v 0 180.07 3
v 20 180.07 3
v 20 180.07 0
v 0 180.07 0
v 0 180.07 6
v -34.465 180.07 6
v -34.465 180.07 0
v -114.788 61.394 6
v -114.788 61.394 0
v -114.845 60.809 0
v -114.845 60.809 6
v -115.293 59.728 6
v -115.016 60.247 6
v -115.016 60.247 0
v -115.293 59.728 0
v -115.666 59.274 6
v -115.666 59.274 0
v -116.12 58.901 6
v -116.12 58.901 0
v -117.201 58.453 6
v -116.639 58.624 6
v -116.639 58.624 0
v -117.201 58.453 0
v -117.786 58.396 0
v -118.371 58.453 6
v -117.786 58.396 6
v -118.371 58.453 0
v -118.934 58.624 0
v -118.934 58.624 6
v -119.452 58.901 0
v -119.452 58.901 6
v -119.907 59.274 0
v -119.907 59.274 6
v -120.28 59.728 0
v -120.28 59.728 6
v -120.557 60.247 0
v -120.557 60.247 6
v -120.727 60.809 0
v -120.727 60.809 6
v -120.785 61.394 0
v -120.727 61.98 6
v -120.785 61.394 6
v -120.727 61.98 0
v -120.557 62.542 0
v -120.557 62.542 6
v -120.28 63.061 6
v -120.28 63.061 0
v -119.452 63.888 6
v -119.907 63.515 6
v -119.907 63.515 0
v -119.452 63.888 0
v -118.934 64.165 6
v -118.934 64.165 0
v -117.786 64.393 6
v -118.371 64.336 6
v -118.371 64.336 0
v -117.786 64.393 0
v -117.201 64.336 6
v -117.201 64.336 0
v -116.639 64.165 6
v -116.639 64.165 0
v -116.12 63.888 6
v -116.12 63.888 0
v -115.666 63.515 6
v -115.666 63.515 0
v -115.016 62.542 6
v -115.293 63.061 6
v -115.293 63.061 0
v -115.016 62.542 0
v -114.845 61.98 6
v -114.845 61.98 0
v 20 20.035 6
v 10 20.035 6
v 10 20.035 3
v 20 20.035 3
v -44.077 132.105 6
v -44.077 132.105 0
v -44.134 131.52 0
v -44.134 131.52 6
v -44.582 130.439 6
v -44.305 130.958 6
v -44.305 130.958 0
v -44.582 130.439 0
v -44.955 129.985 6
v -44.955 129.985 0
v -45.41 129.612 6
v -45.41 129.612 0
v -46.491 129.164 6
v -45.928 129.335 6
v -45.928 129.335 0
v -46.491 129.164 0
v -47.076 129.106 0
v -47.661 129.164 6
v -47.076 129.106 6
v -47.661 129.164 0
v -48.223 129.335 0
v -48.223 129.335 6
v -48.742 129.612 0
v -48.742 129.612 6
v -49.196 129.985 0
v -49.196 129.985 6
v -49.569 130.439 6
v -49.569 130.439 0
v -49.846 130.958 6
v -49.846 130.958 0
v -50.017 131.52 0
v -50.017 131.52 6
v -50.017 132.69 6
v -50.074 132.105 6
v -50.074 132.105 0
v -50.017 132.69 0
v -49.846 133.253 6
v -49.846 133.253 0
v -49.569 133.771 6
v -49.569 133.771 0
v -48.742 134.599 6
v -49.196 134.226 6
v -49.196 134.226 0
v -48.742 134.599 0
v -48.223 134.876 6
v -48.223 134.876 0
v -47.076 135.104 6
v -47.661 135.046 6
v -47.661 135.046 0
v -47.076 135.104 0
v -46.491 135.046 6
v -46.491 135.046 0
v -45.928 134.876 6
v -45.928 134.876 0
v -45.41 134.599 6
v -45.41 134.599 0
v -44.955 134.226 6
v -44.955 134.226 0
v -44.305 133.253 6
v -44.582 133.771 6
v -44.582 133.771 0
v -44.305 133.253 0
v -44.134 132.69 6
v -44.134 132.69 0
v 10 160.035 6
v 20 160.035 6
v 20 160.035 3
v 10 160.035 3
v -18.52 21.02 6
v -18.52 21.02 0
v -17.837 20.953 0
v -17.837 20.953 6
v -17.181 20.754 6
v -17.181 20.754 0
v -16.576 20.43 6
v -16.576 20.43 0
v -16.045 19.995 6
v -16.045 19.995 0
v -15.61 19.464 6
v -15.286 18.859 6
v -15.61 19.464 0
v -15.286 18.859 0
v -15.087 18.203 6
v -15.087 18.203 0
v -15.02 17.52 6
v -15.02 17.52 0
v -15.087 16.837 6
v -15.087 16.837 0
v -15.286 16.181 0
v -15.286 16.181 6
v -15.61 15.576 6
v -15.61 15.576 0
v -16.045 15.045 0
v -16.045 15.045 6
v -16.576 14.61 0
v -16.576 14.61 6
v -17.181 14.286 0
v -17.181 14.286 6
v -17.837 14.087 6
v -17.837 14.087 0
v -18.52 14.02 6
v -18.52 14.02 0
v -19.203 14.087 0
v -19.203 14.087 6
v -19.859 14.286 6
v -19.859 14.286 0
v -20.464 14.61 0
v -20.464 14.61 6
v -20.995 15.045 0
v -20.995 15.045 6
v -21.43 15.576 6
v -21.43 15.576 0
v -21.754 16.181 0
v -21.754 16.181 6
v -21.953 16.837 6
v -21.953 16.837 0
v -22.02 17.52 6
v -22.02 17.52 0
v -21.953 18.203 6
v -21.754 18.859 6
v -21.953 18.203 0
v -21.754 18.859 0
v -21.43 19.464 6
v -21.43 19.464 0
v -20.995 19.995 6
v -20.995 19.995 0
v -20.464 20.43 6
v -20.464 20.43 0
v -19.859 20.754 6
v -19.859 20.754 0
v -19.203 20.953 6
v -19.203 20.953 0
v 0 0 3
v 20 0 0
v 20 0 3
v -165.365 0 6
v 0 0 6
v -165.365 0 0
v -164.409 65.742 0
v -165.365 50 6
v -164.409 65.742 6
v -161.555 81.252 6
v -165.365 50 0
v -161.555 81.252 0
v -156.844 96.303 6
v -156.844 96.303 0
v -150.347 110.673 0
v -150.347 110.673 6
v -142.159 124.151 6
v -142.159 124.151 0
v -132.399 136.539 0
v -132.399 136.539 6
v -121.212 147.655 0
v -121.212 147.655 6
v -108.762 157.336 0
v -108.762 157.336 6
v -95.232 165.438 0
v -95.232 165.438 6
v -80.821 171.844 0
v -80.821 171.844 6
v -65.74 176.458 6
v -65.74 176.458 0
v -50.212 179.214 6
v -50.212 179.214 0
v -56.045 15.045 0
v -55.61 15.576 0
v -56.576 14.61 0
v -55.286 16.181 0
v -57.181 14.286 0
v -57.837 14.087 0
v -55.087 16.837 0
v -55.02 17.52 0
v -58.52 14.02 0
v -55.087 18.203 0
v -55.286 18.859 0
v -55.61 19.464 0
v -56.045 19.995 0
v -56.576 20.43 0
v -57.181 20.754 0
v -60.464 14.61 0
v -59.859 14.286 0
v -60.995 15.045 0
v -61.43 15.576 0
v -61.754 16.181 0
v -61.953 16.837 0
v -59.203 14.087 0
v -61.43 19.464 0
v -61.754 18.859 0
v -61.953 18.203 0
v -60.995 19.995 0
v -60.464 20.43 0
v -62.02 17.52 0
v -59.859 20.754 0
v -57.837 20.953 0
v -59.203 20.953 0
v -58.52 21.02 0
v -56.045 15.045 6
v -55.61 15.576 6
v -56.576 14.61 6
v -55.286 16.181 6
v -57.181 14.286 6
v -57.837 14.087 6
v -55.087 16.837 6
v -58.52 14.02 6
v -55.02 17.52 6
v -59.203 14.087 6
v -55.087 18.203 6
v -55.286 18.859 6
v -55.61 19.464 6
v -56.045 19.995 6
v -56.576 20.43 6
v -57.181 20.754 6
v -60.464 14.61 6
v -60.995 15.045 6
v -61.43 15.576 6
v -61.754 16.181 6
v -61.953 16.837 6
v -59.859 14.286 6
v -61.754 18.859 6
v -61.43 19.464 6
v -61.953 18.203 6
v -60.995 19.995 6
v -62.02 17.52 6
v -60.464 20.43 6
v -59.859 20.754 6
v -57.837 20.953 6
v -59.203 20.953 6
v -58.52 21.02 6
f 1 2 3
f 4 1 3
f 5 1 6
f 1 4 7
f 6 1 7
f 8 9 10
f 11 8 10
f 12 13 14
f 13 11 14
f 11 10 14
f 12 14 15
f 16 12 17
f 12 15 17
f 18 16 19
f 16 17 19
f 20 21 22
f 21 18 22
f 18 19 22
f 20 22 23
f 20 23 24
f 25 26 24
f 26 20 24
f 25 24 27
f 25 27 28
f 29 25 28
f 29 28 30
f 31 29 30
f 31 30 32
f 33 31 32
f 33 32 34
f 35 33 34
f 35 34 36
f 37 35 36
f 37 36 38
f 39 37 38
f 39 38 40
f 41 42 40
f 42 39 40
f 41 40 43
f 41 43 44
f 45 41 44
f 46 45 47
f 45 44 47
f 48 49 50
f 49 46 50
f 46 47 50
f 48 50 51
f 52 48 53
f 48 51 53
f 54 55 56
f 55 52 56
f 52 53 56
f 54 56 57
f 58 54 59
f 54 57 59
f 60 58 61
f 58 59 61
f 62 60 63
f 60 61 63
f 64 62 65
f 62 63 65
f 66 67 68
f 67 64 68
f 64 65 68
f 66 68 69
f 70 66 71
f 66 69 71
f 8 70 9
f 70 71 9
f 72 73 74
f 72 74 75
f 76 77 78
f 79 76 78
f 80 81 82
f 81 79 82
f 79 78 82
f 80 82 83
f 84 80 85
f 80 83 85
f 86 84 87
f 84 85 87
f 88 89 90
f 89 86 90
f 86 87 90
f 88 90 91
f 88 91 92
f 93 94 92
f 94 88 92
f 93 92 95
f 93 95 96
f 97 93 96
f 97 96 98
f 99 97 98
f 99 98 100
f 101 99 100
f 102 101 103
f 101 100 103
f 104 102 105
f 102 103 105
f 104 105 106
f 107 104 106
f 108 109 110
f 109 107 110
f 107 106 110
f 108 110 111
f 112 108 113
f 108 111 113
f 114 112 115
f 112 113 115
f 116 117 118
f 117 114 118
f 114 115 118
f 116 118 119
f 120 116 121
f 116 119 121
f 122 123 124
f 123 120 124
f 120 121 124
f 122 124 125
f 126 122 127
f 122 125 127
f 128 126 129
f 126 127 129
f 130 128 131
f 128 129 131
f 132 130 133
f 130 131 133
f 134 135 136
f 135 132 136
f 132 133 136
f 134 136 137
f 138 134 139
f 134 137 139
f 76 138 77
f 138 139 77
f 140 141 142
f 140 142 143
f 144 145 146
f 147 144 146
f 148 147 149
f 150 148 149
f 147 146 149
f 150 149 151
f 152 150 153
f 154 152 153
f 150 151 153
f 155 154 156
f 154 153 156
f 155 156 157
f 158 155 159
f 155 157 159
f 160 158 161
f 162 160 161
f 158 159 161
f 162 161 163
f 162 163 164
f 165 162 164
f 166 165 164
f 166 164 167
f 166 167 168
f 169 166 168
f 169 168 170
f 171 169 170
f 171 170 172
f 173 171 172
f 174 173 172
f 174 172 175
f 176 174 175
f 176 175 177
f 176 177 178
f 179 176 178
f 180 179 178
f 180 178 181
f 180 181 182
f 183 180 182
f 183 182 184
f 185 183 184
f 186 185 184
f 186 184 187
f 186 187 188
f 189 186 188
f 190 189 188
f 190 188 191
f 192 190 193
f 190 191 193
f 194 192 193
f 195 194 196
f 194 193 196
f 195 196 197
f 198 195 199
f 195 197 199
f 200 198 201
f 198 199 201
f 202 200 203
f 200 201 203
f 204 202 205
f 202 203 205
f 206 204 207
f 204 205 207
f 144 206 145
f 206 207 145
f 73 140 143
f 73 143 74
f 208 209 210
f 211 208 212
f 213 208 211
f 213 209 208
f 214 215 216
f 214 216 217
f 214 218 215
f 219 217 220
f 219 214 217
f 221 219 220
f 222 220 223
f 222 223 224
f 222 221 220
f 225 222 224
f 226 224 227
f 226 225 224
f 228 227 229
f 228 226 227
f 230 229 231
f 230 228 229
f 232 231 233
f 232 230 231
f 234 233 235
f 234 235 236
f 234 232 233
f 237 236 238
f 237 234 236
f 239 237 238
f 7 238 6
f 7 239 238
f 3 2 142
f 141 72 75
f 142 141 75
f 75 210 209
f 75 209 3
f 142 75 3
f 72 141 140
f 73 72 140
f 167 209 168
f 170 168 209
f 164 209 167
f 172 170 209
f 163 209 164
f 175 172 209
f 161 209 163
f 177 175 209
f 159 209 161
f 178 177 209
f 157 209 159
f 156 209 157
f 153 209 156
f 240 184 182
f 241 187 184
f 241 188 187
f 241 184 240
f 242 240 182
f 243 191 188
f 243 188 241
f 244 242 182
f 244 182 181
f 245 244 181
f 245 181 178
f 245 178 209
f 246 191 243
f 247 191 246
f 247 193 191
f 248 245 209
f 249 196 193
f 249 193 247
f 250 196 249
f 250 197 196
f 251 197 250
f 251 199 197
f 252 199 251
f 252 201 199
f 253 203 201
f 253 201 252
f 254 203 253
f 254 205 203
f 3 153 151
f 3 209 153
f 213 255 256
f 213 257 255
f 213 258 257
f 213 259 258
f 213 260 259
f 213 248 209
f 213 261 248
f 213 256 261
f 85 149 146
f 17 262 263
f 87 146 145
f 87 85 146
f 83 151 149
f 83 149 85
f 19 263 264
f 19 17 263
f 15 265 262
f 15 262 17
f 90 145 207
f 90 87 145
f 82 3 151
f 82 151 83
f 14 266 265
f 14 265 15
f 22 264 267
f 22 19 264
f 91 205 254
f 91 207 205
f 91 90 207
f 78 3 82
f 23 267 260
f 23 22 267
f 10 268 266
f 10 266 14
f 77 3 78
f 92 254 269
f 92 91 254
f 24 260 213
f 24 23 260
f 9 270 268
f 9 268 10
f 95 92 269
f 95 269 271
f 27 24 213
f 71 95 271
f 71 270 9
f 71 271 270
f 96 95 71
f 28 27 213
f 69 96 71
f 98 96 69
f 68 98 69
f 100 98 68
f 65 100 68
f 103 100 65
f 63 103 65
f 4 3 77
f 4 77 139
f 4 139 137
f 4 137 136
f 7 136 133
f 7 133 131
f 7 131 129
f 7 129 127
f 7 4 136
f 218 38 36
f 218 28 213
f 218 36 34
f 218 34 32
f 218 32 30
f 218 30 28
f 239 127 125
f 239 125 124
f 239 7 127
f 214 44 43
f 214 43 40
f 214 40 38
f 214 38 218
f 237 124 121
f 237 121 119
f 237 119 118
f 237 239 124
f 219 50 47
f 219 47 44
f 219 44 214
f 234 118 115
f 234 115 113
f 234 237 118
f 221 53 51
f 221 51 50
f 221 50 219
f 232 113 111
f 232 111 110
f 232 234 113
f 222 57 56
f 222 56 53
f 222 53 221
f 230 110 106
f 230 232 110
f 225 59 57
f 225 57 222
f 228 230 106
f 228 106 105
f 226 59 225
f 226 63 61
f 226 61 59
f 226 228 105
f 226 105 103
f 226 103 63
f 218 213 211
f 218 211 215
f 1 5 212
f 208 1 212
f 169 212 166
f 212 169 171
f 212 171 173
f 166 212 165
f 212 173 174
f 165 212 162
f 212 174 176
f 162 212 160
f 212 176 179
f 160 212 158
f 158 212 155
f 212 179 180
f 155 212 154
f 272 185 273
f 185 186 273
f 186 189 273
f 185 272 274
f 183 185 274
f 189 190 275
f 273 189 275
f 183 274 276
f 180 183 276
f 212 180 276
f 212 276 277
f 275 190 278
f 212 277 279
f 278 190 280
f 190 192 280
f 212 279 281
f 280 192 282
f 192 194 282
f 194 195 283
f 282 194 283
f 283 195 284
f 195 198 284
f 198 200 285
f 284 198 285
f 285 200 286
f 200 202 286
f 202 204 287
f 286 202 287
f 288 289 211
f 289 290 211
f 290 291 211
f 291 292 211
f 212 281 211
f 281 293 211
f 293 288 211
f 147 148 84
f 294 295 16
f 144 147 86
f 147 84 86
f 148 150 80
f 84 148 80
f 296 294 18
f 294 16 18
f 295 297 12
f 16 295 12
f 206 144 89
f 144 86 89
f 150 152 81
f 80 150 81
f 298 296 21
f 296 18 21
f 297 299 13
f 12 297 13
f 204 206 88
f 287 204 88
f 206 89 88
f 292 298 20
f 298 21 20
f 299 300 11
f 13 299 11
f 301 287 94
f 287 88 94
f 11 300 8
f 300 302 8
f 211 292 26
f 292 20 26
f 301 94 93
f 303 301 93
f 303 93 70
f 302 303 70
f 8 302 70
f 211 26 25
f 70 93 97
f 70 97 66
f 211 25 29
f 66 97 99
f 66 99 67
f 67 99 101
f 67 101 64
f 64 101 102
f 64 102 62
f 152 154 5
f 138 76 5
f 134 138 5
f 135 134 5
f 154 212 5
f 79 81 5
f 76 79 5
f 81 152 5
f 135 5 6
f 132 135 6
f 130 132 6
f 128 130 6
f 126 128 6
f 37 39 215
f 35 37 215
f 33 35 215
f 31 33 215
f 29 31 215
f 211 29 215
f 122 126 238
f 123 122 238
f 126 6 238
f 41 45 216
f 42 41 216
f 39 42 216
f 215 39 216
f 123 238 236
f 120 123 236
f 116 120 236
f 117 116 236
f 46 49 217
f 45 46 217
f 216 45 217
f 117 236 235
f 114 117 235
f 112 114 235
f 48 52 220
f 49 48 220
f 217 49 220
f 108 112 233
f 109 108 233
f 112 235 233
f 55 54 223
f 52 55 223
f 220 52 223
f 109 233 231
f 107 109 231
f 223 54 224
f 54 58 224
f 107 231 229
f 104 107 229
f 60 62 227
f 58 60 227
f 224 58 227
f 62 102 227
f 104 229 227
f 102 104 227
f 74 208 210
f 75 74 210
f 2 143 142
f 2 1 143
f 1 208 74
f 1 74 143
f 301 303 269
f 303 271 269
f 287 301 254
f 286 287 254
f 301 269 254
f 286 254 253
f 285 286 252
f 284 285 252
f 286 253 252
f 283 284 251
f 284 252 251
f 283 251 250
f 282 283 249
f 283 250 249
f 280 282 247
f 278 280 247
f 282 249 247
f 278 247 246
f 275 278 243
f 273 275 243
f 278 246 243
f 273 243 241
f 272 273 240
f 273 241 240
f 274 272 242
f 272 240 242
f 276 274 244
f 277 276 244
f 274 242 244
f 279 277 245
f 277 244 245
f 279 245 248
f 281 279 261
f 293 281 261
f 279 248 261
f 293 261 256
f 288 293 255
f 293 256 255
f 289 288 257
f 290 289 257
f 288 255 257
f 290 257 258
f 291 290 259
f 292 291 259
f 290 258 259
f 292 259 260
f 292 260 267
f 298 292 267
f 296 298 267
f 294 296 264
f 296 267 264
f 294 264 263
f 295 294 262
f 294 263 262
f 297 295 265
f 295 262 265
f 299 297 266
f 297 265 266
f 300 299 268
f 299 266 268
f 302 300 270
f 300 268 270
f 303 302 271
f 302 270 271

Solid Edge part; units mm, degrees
sketch "Sketch1" plane through (0, 0, 0) normal (0, 0, 1) x (1, 0, 0)
  line L0 (0, 0) -> (-165.365, 0)
  line L1 (-165.365, 0) -> (-165.365, 50)
  arc A0 (-165.365, 50) -> (-34.465, 180.07) centre (-35.291, 49.9987) cw
  line L2 (0, 180.07) -> (-34.465, 180.07)
  line L3 (0, 0) -> (0, 180.07)
  circle A1 centre (-47.0756, 132.1051) radius 2.9988
  circle A2 centre (-117.7863, 61.3945) radius 2.9988
  dimension "D1" = 165.365
  dimension "D2" = 180.07
  dimension "D3" = 34.465
  dimension "D4" = 50
  dimension "D5" = 130.074
  dimension "D6" = 5.9975
  dimension "D7" = 70.7107
  dimension "D8" = 70.7107
  dimension "D9" = 47.0756
  dimension "D10" = 47.9649
extrude "Protrusion1" add sketch "Sketch1" along normal blind 6
sketch "Sketch2" plane through (0, 90.035, 3) normal (1, 0, 0) x (0, 1, 0)
  line L0 (-90.035, 3) -> (90.035, 3)
  line L1 (90.035, 3) -> (90.035, -3)
  line L2 (90.035, -3) -> (-90.035, -3)
  line L3 (-90.035, -3) -> (-90.035, 3)
extrude "Extrusionsausprägung_2" add sketch "Sketch2" along normal blind 20
sketch "Sketch3" plane through (-72.6825, 90.0363, 6) normal (0, 0, 1) x (1, 0, 0)
  line L0 (92.6825, 90.0337) -> (72.6825, 90.0337)
  line L1 (72.6825, 90.0337) -> (72.6825, -90.0363)
  line L2 (72.6825, -90.0363) -> (92.6825, -90.0363)
  line L3 (92.6825, -90.0363) -> (92.6825, -70.0013)
  line L4 (82.6825, -70.0013) -> (92.6825, -70.0013)
  line L5 (82.6825, 69.9987) -> (82.6825, -70.0013)
  line L6 (92.6825, 69.9987) -> (82.6825, 69.9987)
  line L7 (92.6825, 90.0337) -> (92.6825, 69.9987)
extrude "Extrusionsausschnitt_1" cut sketch "Sketch3" against normal blind 3
sketch "Sketch4" plane through (-72.6825, 90.0363, 0) normal (0, 0, -1) x (0, 1, 0)
  circle A0 centre (-72.5163, 54.1625) radius 3.5
  circle A1 centre (-72.5163, 14.1625) radius 3.5
  dimension "D1" = 7
  dimension "D2" = 40
  dimension "D3" = 17.52
  dimension "D4" = 38.52
extrude "Cutout1" cut sketch "Sketch4" against normal through all
properties material "Nylon, allgemein"
